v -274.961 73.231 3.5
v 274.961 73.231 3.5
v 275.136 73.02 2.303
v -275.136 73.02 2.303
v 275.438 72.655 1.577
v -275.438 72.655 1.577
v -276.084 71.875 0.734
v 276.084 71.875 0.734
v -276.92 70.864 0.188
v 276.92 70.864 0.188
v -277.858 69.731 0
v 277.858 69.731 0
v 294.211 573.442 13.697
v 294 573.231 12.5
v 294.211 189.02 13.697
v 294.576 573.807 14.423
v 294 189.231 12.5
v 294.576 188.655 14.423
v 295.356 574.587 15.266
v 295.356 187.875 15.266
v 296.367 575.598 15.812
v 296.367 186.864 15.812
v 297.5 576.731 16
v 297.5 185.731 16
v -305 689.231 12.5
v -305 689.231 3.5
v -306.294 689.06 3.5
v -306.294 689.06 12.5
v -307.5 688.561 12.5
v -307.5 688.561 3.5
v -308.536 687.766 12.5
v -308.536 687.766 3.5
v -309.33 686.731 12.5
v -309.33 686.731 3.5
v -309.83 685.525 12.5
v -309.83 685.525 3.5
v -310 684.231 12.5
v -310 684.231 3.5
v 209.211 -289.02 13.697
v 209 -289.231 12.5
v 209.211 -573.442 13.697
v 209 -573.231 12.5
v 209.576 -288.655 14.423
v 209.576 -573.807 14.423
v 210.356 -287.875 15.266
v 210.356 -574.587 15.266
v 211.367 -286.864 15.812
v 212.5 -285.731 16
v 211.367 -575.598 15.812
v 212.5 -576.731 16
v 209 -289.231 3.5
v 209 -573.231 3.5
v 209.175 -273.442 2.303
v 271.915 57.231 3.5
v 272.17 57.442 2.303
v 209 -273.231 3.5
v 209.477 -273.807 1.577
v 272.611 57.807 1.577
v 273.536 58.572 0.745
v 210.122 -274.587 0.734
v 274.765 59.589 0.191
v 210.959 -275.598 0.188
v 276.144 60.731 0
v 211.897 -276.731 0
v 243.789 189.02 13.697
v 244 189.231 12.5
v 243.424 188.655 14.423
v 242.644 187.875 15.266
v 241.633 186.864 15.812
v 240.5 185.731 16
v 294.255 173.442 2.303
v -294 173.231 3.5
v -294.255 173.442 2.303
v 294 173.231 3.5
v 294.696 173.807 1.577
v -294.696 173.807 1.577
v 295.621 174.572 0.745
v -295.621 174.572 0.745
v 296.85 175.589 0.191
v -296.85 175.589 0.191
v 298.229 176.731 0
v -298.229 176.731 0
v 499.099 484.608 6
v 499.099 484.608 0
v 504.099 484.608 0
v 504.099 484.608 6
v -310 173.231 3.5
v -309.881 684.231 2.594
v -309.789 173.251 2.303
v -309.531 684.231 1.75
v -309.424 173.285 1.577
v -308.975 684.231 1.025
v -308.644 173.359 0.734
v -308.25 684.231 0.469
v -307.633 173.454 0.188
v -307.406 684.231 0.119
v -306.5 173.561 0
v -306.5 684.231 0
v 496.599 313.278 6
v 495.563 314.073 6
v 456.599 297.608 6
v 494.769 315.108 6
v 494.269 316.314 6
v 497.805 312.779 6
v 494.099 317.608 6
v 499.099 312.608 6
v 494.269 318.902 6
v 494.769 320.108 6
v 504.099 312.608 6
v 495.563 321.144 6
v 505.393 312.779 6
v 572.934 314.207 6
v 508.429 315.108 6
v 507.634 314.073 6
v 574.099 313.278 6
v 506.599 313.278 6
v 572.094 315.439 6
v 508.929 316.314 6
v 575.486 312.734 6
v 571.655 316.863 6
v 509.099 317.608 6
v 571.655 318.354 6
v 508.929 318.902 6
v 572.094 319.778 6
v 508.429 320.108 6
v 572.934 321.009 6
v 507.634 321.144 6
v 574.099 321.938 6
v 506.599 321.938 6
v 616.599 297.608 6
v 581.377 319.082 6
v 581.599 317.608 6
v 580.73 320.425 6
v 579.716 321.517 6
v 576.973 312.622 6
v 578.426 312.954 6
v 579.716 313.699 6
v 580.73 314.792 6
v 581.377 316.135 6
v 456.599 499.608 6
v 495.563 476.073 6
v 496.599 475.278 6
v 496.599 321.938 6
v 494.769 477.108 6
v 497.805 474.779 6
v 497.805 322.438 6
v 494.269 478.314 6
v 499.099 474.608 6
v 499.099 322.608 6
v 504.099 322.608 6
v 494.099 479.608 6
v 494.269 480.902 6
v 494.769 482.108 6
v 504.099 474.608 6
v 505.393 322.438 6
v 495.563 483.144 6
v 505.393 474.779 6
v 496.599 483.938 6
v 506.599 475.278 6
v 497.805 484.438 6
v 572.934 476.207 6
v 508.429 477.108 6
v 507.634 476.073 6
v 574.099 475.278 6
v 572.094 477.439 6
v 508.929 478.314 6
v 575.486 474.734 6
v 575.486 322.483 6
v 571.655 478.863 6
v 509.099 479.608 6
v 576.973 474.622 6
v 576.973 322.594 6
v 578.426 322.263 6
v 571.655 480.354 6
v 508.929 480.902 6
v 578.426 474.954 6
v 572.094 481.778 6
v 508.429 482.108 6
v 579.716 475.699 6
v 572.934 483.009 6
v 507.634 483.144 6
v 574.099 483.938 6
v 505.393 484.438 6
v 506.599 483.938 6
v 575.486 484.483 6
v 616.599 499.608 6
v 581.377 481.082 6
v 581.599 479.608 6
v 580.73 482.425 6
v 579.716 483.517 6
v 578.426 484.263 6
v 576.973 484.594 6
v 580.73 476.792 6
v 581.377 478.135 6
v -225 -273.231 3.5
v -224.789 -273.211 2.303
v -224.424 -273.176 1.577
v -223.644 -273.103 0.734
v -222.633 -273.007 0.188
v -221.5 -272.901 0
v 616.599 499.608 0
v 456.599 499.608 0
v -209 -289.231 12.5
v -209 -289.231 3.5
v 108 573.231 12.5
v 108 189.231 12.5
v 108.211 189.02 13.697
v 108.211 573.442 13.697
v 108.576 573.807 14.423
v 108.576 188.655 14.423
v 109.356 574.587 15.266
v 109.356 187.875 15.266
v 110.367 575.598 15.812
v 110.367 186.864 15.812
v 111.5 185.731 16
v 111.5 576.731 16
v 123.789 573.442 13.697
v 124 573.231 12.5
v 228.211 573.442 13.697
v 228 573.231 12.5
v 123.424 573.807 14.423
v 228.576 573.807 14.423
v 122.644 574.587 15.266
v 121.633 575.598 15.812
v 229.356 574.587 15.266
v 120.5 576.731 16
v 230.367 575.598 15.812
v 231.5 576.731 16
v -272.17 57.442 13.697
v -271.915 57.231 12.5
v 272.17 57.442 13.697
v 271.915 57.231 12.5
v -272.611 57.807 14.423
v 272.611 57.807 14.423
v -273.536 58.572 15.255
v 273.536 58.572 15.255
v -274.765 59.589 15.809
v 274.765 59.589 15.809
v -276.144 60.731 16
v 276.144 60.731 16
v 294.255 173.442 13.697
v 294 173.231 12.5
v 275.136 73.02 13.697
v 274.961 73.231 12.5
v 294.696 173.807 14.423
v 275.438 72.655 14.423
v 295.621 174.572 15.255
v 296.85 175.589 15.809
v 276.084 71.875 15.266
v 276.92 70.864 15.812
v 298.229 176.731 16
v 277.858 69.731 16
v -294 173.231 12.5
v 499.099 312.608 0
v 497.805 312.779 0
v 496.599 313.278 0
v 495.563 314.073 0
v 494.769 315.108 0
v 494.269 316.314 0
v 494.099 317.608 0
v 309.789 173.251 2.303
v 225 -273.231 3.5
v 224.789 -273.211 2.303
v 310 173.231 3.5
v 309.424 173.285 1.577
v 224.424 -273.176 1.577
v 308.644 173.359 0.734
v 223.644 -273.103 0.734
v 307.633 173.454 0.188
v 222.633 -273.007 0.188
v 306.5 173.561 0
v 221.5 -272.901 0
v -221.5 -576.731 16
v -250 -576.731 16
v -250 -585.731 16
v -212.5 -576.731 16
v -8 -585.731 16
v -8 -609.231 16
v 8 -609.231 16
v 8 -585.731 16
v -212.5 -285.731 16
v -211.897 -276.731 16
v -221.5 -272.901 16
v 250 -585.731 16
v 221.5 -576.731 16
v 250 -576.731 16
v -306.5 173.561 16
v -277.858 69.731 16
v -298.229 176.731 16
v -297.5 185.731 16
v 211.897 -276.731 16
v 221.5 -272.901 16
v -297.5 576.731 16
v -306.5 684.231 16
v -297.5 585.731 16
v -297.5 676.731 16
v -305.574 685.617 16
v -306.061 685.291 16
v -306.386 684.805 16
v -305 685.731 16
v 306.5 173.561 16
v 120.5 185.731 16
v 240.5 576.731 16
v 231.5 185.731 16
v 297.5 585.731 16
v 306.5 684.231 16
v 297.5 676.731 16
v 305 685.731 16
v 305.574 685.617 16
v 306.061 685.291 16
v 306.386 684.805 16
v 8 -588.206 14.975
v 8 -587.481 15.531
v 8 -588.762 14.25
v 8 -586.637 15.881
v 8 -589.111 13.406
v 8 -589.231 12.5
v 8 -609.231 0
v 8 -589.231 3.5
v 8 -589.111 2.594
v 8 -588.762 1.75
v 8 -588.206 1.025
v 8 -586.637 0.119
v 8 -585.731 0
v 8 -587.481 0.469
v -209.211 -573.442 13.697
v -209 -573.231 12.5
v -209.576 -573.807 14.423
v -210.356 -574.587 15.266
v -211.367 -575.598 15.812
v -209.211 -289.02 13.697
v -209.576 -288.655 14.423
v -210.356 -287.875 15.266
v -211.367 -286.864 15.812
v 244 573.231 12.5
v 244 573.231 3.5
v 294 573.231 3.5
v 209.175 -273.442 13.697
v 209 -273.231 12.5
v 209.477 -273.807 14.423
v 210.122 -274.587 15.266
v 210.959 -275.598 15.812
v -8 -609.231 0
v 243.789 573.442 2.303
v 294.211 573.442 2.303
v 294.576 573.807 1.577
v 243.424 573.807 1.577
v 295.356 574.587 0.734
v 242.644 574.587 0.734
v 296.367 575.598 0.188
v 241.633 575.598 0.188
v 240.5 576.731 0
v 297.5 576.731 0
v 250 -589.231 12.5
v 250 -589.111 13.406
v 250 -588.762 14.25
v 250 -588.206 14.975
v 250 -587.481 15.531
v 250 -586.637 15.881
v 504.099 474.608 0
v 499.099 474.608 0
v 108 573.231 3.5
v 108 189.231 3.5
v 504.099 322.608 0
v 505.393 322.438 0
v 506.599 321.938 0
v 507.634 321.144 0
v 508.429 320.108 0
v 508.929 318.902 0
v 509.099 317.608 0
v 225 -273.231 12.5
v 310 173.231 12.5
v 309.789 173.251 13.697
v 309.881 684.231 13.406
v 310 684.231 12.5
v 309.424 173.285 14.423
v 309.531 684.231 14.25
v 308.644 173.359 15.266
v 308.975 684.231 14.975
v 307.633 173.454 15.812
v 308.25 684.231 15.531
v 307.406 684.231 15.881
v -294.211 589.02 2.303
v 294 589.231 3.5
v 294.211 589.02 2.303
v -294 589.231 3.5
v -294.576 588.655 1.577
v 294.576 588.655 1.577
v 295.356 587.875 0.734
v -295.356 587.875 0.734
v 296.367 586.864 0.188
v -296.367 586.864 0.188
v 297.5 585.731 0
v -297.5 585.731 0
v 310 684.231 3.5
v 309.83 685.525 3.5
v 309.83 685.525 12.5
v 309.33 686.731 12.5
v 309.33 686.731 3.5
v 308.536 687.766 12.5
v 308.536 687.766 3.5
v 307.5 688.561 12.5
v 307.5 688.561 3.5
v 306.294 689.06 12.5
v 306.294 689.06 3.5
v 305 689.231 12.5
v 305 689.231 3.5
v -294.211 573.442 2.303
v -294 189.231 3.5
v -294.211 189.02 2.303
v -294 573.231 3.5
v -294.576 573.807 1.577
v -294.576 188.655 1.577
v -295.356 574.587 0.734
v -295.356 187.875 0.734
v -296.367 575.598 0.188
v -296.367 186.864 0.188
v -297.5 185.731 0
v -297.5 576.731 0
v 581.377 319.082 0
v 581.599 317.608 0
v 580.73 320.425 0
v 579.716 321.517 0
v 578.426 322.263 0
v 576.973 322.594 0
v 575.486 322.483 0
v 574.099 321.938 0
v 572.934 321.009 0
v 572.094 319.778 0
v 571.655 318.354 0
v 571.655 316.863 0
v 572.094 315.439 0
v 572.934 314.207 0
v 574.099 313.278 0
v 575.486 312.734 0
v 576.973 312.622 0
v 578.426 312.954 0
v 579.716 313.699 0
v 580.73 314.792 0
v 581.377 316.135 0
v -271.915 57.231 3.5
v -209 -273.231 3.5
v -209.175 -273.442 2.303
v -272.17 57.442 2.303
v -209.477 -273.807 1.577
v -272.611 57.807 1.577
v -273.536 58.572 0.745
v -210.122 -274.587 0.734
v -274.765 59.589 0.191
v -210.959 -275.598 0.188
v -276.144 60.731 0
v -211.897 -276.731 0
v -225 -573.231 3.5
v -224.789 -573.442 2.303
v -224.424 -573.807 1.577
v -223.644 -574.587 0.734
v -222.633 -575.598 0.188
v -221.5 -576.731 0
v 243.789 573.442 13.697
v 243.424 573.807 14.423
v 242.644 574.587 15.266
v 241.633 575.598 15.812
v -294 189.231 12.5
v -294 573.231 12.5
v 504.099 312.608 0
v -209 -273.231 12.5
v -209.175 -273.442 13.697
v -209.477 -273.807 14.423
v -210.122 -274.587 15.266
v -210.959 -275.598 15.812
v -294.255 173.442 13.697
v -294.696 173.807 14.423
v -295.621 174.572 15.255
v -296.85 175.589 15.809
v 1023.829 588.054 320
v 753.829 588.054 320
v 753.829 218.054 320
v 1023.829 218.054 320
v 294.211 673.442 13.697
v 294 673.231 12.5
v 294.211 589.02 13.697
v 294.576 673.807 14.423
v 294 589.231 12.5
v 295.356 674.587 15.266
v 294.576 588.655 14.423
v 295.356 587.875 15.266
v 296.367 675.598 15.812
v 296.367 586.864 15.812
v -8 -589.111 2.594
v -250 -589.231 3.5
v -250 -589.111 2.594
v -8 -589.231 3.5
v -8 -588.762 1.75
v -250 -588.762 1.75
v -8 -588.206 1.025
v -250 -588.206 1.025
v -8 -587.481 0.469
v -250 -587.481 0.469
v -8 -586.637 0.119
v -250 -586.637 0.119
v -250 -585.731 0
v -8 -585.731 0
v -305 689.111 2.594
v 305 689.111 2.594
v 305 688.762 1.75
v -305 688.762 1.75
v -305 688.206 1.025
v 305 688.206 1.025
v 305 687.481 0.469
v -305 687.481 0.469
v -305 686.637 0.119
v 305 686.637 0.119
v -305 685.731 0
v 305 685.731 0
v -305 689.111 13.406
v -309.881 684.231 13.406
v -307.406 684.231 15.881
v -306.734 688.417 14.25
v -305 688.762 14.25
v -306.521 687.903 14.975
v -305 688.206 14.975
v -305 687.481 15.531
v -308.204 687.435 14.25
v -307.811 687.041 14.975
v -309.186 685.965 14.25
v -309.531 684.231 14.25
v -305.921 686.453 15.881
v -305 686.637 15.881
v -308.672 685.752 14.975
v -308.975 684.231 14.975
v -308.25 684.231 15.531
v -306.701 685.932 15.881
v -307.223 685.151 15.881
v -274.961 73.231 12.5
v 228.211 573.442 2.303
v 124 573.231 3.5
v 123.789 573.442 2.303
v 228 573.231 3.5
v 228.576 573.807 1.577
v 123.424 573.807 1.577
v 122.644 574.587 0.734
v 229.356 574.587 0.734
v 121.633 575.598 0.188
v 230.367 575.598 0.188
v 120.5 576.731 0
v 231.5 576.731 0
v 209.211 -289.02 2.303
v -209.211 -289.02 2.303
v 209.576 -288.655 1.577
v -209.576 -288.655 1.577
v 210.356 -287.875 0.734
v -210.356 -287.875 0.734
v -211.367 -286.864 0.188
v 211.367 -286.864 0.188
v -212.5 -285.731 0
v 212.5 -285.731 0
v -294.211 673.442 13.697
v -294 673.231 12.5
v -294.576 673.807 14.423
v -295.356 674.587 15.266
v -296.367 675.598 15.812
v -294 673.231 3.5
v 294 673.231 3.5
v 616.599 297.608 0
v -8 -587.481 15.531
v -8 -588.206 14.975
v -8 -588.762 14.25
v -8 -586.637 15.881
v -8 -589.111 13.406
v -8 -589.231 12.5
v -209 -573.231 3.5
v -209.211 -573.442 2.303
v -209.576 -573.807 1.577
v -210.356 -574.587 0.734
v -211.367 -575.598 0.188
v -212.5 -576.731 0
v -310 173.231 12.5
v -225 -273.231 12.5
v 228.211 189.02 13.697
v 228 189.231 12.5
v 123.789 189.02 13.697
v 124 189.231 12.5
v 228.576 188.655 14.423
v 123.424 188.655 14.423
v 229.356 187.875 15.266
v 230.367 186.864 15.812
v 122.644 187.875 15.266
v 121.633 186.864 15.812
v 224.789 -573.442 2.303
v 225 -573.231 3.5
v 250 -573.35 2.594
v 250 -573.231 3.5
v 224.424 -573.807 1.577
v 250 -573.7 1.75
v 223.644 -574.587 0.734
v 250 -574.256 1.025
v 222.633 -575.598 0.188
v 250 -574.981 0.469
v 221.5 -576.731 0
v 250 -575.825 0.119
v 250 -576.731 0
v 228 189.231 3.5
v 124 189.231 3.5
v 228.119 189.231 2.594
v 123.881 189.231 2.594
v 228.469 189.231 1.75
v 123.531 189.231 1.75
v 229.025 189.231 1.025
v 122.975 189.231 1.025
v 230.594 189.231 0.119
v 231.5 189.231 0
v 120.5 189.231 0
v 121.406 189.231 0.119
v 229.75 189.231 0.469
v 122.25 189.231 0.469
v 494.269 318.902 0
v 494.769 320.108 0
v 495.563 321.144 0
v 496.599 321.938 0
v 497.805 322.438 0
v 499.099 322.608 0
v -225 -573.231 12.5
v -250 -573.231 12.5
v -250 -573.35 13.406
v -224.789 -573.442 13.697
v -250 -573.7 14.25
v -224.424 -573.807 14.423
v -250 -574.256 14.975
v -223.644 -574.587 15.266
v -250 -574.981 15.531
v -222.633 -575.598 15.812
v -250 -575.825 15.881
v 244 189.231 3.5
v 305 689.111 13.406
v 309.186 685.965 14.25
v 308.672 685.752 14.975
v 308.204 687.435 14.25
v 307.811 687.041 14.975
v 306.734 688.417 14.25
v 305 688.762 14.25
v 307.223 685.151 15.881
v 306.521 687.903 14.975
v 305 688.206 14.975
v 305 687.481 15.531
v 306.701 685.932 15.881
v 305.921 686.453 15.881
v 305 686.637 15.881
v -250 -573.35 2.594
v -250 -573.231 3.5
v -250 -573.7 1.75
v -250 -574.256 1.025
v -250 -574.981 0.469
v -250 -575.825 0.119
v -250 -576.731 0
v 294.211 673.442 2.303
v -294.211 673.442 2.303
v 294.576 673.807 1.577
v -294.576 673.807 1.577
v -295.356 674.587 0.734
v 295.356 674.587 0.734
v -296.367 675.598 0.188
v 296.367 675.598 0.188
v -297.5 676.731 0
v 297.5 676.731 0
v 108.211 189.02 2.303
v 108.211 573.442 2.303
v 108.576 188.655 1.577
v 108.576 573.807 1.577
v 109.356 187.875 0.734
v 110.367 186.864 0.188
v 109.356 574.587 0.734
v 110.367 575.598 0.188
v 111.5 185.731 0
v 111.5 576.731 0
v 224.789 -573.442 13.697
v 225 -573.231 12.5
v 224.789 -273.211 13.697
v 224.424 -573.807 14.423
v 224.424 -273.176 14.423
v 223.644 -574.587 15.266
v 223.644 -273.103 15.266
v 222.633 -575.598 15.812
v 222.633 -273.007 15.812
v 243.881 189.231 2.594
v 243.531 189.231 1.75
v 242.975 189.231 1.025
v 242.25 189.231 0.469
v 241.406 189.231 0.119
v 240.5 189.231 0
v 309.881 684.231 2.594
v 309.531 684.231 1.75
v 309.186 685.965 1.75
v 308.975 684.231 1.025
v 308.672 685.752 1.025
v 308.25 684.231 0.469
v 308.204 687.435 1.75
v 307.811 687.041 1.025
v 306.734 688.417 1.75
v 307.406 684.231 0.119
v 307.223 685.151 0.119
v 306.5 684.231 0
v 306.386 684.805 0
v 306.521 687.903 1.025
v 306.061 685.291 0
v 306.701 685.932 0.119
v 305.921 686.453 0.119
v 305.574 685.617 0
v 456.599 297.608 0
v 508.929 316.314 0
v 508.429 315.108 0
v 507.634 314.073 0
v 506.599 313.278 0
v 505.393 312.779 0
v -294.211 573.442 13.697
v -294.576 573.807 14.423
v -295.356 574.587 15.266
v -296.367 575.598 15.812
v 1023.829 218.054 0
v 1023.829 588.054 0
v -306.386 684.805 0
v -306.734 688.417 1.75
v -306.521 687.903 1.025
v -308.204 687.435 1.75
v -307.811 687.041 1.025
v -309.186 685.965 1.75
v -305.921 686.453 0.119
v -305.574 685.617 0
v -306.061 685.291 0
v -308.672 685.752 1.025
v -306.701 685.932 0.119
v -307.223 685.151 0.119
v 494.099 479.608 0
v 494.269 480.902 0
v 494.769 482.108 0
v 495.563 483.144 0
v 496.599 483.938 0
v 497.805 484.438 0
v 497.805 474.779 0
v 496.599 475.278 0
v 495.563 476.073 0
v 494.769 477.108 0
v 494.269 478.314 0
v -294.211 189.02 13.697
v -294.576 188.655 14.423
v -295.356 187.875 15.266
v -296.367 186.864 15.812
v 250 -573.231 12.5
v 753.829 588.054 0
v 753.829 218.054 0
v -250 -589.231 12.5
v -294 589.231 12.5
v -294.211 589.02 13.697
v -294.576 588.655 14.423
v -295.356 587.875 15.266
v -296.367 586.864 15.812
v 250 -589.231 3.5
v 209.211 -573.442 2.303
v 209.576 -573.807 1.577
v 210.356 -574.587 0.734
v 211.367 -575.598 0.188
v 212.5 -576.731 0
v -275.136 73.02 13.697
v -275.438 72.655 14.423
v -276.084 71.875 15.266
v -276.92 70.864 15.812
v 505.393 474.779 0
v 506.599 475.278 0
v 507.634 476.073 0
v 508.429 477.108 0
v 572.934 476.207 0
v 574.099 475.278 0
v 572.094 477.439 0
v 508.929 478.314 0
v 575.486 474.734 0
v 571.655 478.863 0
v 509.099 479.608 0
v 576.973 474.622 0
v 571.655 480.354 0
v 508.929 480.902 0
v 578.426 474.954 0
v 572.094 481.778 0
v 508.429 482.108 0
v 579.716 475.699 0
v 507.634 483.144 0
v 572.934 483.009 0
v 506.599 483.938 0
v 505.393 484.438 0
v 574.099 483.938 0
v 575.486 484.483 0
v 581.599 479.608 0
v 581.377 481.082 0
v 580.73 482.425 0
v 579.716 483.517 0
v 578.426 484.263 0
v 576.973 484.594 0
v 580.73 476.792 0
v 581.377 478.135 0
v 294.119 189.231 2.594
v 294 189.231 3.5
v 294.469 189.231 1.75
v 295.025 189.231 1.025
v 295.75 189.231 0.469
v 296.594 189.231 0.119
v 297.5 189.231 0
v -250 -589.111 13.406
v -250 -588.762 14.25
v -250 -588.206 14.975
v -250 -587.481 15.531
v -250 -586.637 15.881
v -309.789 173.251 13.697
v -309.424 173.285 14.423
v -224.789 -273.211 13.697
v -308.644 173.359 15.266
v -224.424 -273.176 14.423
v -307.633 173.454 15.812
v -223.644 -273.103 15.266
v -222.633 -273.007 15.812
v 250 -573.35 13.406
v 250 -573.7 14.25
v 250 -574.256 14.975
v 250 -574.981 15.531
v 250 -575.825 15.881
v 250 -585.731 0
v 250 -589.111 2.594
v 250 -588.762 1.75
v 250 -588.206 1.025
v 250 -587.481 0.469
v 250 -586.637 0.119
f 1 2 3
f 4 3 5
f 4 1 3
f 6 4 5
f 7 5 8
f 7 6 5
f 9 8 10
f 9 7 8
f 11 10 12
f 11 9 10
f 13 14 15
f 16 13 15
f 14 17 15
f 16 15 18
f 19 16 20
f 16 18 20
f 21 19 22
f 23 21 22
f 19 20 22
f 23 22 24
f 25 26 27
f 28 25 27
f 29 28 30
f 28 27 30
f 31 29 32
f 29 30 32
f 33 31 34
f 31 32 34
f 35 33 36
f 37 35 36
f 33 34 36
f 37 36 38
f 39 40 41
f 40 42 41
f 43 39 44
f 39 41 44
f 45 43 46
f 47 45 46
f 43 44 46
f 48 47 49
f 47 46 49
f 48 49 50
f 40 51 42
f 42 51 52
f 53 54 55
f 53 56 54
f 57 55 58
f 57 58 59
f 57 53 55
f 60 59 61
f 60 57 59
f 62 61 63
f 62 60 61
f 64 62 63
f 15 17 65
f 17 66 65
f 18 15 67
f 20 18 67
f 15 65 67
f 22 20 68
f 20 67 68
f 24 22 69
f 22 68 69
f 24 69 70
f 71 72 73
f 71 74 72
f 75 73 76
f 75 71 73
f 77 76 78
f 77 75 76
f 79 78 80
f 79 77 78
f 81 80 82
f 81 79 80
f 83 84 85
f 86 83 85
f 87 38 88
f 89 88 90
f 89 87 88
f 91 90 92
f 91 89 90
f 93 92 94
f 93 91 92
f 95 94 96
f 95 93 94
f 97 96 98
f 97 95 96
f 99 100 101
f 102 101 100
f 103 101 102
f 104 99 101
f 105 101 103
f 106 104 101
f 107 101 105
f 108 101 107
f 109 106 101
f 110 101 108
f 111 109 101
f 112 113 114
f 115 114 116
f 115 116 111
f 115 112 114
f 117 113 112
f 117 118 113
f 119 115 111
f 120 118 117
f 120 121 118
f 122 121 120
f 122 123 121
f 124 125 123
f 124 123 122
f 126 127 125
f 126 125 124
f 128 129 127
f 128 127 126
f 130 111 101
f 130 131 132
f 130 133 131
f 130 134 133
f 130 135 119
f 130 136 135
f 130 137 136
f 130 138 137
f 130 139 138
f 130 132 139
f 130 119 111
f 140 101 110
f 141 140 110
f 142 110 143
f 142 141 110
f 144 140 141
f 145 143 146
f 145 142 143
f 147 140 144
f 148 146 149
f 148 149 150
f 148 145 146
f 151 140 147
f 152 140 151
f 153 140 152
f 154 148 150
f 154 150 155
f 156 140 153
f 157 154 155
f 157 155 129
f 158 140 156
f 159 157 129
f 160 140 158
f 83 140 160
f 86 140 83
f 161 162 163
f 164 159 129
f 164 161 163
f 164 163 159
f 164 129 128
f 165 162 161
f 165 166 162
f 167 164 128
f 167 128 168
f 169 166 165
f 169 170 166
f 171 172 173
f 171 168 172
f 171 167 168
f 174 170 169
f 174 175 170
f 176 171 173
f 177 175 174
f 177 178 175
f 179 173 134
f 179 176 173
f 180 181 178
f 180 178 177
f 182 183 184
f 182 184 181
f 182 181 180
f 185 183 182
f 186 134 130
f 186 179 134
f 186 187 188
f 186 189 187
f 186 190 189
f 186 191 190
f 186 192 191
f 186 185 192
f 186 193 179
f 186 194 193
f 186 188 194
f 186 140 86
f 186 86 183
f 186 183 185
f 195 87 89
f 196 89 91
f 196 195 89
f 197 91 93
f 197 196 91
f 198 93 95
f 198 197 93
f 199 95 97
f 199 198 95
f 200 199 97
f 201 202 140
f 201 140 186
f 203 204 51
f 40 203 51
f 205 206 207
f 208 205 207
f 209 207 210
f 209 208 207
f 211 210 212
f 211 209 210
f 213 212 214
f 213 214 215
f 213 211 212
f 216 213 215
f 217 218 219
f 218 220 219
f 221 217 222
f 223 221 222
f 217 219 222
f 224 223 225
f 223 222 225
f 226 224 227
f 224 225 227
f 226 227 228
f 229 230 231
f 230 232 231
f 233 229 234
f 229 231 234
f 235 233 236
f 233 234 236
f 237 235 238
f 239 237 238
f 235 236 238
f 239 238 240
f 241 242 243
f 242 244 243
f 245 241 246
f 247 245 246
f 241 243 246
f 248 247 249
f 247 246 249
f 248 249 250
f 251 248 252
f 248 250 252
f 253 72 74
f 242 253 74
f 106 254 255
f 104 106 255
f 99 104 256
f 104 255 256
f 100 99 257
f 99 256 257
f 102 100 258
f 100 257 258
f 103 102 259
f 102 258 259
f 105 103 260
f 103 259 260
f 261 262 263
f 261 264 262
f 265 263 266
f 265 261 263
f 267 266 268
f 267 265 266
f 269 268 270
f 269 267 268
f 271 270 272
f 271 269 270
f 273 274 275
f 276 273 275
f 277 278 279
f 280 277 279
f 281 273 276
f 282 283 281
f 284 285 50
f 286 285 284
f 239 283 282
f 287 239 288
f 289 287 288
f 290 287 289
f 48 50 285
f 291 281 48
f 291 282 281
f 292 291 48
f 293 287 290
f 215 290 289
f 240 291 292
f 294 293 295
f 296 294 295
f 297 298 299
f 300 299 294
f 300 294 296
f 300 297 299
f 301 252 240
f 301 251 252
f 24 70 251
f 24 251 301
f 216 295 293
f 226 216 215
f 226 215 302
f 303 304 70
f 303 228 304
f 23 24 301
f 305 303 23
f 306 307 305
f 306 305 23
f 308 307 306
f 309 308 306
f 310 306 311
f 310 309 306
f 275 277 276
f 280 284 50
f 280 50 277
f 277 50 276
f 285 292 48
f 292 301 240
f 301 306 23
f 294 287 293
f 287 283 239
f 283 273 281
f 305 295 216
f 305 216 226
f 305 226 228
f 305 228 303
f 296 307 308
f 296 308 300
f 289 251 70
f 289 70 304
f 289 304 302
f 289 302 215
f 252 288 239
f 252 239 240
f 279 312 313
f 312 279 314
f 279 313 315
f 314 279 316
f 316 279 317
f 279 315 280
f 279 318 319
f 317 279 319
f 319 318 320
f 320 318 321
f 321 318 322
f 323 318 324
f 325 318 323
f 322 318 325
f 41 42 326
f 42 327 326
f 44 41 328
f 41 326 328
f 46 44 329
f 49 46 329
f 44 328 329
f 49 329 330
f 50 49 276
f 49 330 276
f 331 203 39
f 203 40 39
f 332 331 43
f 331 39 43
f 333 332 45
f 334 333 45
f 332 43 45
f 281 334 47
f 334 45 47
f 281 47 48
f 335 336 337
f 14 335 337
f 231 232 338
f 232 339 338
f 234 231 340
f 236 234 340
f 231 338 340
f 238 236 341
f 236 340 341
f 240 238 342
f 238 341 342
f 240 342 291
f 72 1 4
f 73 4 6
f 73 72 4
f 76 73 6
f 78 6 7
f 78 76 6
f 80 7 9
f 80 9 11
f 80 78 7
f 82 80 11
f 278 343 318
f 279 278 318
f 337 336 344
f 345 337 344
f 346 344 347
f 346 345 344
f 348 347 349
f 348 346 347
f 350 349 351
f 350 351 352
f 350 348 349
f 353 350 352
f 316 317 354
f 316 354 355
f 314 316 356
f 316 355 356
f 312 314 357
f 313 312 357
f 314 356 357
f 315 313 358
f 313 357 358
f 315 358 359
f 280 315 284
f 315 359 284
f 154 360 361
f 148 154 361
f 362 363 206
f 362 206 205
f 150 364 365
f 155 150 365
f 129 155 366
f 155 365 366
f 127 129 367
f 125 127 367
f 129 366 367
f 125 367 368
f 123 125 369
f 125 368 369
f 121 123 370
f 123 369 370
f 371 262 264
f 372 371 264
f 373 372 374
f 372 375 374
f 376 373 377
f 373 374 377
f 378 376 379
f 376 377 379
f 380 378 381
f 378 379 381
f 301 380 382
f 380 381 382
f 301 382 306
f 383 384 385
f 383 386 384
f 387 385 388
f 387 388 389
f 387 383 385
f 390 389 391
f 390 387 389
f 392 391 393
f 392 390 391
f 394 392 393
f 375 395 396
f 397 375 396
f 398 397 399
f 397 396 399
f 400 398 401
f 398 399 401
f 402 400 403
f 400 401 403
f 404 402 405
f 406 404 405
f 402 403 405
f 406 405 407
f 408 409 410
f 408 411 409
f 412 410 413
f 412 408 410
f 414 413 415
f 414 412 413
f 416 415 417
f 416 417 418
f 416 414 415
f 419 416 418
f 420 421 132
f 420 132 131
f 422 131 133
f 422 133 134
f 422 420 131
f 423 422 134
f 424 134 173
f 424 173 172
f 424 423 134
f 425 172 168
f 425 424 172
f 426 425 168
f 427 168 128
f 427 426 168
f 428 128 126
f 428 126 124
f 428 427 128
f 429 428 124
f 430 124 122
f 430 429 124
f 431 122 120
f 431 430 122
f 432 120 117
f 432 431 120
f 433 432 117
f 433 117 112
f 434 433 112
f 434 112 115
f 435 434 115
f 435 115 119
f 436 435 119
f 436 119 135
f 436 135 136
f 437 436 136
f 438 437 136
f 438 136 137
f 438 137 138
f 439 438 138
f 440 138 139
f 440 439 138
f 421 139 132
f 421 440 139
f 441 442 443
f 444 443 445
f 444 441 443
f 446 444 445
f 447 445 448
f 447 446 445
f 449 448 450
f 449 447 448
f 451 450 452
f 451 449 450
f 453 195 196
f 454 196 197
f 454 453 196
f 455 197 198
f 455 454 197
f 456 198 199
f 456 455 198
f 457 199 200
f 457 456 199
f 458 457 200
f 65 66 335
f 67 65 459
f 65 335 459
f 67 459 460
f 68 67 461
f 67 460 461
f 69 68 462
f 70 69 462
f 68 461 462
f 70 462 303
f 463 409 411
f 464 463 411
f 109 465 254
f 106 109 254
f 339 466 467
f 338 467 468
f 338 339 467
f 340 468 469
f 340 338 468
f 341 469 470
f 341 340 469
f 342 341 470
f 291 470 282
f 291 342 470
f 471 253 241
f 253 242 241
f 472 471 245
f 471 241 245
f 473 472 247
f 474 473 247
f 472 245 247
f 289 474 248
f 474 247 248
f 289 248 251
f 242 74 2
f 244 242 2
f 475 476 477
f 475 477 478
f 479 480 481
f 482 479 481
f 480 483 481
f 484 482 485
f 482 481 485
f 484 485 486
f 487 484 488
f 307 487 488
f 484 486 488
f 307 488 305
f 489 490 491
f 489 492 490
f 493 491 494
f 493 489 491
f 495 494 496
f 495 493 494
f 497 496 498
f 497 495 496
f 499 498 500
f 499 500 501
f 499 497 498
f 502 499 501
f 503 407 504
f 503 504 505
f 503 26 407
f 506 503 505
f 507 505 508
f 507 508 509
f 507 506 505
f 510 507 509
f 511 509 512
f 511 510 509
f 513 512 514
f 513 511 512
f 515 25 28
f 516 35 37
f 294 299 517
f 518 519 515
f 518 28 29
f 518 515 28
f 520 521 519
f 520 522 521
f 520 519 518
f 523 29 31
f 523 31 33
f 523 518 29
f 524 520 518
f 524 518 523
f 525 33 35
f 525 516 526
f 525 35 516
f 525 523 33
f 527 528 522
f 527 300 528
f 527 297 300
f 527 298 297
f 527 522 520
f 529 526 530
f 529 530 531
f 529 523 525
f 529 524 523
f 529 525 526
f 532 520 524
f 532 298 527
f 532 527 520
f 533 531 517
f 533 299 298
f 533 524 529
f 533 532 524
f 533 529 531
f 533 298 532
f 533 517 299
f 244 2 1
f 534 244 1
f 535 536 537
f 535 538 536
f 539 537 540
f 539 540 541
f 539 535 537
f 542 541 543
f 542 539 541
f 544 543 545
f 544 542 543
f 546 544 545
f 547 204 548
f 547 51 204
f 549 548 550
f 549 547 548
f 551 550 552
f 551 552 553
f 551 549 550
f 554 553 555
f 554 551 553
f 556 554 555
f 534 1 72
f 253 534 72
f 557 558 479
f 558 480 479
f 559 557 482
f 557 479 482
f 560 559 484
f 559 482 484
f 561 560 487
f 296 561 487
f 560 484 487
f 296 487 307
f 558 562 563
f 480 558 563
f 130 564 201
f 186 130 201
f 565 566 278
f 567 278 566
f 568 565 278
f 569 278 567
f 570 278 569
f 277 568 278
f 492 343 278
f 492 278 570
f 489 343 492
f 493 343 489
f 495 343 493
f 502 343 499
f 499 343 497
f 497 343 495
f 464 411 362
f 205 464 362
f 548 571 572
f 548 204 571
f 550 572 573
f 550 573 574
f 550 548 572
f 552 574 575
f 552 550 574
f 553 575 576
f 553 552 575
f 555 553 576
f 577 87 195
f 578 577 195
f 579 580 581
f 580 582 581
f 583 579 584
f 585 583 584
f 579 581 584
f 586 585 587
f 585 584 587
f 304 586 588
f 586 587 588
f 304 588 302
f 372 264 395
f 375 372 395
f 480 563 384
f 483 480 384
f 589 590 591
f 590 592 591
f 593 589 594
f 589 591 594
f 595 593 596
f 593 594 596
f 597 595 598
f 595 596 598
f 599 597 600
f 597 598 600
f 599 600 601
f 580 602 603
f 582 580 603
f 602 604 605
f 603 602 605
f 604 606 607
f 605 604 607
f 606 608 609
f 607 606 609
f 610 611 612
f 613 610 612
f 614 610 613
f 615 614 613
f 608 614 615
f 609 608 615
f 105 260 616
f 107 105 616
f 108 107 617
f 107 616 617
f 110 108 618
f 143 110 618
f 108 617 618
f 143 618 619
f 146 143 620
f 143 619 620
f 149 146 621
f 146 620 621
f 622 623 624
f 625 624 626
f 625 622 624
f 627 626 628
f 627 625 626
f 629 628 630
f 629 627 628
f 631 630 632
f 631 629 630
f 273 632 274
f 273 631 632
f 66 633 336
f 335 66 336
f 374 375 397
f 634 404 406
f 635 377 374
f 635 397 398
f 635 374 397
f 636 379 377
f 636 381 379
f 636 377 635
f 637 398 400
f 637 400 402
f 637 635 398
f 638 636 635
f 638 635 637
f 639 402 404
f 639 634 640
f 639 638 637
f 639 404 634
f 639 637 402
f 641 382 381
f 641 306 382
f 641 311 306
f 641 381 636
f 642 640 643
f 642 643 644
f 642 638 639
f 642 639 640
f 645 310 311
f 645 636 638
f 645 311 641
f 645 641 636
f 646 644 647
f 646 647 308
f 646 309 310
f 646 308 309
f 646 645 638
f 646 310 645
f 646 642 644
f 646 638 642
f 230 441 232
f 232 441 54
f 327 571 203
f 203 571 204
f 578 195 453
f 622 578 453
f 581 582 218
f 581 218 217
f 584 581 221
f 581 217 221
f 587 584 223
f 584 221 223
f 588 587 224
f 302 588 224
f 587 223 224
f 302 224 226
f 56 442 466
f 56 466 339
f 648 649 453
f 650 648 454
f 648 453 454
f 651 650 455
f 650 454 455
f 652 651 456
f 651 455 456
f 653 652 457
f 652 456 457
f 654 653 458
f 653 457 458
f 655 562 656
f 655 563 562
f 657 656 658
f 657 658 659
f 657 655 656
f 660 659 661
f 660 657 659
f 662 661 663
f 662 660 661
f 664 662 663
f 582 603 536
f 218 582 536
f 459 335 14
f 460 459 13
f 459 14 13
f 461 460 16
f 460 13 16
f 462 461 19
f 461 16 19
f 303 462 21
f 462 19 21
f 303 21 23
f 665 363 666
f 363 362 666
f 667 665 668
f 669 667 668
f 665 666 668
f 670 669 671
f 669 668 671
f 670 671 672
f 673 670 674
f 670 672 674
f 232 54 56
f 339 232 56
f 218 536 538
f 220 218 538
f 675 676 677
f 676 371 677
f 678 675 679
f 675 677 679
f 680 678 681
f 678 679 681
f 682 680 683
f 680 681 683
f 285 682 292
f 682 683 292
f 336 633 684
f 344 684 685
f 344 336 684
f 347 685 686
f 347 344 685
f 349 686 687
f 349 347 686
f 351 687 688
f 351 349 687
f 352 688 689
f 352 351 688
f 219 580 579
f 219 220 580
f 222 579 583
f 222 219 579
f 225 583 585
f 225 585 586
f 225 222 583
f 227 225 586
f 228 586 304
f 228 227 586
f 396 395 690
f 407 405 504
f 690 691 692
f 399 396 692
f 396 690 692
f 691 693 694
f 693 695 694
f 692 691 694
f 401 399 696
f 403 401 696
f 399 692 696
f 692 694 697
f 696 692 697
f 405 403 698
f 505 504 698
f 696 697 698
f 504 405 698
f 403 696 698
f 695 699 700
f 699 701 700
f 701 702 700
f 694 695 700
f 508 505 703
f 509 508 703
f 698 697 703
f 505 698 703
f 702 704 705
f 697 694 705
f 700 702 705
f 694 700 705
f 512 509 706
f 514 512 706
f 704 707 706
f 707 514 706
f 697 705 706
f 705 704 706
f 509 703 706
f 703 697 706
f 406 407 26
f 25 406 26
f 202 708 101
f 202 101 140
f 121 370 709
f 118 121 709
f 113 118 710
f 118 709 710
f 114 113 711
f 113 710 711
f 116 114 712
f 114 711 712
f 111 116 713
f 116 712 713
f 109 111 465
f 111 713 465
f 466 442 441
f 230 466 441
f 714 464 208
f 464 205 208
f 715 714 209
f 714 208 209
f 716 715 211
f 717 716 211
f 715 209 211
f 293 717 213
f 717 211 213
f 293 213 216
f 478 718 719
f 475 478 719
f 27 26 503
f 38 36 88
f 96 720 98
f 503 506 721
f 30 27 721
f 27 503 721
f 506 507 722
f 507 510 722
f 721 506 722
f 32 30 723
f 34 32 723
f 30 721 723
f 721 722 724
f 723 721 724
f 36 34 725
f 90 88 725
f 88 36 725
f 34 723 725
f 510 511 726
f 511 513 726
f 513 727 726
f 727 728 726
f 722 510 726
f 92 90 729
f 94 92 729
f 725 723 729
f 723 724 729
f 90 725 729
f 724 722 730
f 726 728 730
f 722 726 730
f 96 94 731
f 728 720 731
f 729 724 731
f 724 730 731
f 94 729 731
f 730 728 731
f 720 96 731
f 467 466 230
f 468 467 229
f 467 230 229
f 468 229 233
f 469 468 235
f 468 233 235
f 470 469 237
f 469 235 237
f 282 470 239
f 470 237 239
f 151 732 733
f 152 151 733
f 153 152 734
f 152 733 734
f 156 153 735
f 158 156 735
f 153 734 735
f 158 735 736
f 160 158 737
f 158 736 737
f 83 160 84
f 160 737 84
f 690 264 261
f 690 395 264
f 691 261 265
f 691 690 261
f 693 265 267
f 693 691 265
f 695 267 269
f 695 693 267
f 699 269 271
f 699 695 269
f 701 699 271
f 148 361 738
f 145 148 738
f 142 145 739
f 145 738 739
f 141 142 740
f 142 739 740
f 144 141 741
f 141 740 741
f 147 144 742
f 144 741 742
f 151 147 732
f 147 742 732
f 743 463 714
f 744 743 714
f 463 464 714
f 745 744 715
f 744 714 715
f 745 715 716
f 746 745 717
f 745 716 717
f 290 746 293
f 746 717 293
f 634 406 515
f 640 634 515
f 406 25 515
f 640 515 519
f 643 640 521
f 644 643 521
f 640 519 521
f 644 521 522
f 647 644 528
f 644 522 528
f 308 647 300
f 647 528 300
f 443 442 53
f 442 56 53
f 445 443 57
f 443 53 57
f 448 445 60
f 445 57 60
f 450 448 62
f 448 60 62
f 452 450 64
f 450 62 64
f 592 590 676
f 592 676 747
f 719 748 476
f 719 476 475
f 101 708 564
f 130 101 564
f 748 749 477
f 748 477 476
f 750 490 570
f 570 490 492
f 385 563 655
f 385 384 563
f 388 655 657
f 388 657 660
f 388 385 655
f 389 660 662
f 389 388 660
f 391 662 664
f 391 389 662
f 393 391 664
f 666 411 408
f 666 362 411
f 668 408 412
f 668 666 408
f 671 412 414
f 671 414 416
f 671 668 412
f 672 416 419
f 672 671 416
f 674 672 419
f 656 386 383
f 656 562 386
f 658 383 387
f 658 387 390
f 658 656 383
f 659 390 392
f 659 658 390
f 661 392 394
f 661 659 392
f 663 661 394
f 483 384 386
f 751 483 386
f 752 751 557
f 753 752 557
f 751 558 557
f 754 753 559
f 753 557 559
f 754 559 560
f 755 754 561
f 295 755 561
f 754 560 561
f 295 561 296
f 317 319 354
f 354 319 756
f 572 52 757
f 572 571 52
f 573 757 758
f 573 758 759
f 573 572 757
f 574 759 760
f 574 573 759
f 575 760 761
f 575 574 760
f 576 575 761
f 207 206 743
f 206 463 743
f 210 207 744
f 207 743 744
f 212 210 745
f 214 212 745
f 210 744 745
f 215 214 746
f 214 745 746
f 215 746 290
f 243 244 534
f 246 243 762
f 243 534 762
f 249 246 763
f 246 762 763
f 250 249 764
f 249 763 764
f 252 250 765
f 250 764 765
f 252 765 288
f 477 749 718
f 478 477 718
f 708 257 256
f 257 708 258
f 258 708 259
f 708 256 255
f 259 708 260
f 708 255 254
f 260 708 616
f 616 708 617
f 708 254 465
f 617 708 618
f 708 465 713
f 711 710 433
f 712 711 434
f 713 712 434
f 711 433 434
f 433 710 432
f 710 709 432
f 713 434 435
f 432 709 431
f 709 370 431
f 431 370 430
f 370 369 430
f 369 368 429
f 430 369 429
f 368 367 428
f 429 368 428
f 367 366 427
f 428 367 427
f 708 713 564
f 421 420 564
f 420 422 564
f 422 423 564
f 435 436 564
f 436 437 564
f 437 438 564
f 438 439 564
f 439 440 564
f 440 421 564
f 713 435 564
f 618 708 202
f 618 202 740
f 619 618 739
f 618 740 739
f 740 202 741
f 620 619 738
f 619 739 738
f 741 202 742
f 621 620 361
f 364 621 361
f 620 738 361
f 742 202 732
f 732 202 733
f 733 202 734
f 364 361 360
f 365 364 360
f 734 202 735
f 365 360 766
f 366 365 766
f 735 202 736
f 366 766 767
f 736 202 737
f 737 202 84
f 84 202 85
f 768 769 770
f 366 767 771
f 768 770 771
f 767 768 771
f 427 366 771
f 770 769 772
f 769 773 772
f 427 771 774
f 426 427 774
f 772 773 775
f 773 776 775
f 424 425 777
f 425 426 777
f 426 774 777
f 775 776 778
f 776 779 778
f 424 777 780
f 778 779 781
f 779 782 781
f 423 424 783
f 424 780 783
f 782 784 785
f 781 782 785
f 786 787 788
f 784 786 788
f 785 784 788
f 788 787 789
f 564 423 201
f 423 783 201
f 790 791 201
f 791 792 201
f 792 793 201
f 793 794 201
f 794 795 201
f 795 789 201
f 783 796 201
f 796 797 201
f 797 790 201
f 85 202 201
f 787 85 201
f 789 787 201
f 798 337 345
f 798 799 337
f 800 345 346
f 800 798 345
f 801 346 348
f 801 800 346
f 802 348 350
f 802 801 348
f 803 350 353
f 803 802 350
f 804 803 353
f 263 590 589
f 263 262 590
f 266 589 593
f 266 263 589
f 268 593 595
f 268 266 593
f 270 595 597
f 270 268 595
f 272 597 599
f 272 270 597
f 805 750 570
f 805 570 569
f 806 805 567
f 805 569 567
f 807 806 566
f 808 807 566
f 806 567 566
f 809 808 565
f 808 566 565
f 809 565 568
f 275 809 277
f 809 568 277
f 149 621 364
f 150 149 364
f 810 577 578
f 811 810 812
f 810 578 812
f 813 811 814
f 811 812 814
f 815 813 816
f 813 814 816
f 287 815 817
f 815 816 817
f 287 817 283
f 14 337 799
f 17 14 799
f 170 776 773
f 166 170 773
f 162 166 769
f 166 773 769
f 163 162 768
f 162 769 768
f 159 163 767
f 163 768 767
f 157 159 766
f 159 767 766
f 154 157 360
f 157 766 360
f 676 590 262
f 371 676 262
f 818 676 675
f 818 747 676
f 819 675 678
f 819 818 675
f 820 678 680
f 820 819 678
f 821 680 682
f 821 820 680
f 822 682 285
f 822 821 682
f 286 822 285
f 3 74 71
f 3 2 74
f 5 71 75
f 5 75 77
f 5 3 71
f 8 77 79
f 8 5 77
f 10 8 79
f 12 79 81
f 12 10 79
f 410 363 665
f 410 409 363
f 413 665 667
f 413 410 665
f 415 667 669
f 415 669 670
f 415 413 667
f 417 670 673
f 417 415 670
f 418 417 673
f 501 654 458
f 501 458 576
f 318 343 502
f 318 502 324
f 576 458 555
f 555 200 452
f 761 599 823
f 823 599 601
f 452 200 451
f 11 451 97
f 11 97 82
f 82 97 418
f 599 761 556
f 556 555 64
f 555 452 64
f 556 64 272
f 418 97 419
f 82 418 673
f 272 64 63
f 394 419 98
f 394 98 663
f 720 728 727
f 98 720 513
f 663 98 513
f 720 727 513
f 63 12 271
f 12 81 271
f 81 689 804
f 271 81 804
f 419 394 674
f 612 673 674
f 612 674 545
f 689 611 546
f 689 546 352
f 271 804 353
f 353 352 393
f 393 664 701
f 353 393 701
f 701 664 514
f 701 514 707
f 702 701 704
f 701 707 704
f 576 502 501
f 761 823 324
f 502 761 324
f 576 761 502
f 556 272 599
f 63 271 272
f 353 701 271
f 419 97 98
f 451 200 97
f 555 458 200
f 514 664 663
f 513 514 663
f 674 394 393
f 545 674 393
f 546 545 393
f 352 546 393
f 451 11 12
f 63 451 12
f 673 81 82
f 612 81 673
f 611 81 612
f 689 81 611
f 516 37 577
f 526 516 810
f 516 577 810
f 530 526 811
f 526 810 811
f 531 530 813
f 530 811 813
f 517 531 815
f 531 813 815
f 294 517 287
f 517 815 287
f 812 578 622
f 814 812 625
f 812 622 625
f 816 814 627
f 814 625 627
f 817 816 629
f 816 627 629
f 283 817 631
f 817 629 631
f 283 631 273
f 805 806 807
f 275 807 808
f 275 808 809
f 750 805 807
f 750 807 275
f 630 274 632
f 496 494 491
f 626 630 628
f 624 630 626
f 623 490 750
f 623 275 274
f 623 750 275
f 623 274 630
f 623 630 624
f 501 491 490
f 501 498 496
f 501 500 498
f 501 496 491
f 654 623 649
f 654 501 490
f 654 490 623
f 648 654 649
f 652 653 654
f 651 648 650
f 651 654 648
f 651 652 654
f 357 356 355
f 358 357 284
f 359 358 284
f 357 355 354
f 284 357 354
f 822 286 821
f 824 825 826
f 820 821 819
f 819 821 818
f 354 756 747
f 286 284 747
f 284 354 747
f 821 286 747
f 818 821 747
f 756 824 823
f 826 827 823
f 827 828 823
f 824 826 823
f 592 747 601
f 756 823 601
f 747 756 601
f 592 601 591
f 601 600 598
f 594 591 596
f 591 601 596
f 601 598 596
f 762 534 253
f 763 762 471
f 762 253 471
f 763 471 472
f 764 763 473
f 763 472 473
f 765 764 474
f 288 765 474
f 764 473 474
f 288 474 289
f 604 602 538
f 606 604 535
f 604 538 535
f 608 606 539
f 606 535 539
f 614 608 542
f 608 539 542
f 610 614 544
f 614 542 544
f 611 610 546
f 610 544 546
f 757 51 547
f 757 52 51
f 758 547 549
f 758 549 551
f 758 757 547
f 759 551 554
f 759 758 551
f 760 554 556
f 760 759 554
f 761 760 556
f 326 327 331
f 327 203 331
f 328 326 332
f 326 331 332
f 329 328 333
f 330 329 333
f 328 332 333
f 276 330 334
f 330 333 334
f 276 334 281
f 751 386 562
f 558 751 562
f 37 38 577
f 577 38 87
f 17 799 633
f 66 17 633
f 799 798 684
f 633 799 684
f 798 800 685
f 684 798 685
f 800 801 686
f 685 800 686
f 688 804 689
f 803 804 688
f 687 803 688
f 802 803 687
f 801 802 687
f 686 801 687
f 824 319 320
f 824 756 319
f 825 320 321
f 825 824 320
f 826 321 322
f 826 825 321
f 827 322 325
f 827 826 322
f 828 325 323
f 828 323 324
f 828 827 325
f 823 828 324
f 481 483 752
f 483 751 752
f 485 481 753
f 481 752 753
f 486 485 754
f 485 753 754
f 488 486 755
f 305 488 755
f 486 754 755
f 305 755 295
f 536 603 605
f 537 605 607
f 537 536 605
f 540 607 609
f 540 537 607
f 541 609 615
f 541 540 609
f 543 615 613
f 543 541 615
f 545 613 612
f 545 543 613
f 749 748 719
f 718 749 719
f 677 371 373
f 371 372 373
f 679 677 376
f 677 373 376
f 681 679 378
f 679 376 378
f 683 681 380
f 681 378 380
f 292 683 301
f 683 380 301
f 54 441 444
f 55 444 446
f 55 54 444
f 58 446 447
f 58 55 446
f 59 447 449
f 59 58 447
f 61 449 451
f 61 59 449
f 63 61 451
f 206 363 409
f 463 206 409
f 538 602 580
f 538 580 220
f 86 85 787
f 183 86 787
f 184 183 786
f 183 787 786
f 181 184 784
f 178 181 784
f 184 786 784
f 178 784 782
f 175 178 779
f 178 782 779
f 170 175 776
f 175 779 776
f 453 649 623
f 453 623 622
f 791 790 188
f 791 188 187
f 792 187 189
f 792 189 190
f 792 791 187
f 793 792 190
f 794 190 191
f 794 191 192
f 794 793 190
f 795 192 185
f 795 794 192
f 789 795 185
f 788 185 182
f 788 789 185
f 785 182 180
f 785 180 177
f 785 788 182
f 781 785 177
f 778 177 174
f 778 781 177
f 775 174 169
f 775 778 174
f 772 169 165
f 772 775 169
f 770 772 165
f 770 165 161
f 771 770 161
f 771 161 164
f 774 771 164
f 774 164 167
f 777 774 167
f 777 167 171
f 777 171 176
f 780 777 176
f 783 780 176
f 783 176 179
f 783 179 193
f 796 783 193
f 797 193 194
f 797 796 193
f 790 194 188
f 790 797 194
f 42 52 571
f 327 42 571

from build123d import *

# Parameters (mm, degrees)
F0_W     = 25
F0_H     = 16
F0_W_2   = 16
F0_H_2   = 20
F0_H_3   = 384
F0_W_3   = 418
F1_DEPTH = 16
F2_R     = 3.5
F3_W     = 270
F3_H     = 370
F4_DEPTH = 320
F5_W     = 160
F5_H     = 202
F5_R     = 5
F6_DEPTH = 6


# Not quite as in the source:
# - a feature names something its author has since deleted; it is built from what else it names


with BuildPart() as f1:
    # F0 (on Top) → F1 (new body)
    with BuildSketch(Plane.XY):
        Polygon((209, -589.2307258319), (225, -589.2307258319), (225, -573.2307258319), (225, -273.2307258319), (310, 173.2307258319), (310, 589.2307258319), (294, 589.2307258319), (-294, 589.2307258319), (-310, 589.2307258319), (-310, 173.2307258319), (-225, -273.2307258319), (-225, -573.2307258319), (-225, -589.2307258319), (-209, -589.2307258319), (-8, -589.2307258319), (8, -589.2307258319), align=None)
        Polygon((244, 573.2307258319), (294, 573.2307258319), (294, 189.2307258319), (294, 173.2307258319), (274.9614022256, 73.2307258319), (271.9152265817, 57.2307258319), (209, -273.2307258319), (209, -289.2307258319), (209, -573.2307258319), (-209, -573.2307258319), (-209, -289.2307258319), (-209, -273.2307258319), (-271.9152265817, 57.2307258319), (-274.9614022256, 73.2307258319), (-294, 173.2307258319), (-294, 189.2307258319), (-294, 573.2307258319), (108, 573.2307258319), (124, 573.2307258319), (228, 573.2307258319), align=None, mode=Mode.SUBTRACT)
        with Locations((237.5, -581.2307258319)):
            Rectangle(F0_W, F0_H)
        with Locations((0, -599.2307258319)):
            Rectangle(F0_W_2, F0_H_2)
        with BuildLine():
            Line((294, 589.2307258319), (310, 589.2307258319))
            Line((310, 589.2307258319), (310, 684.2307258319))
            ThreePointArc((310, 684.2307258319), (308.5355339059, 687.7662597378), (305, 689.2307258319))
            Line((305, 689.2307258319), (-305, 689.2307258319))
            ThreePointArc((-305, 689.2307258319), (-308.5355339059, 687.7662597378), (-310, 684.2307258319))
            Line((-310, 684.2307258319), (-310, 589.2307258319))
            Line((-310, 589.2307258319), (-294, 589.2307258319))
            Line((-294, 589.2307258319), (-294, 673.2307258319))
            Line((-294, 673.2307258319), (294, 673.2307258319))
            Line((294, 673.2307258319), (294, 589.2307258319))
        make_face()
        with Locations((-237.5, -581.2307258319)):
            Rectangle(F0_W, F0_H)
        with Locations((236, 381.2307258319)):
            Rectangle(F0_W_2, F0_H_3)
        Polygon((294, 173.2307258319), (294, 189.2307258319), (244, 189.2307258319), (228, 189.2307258319), (124, 189.2307258319), (108, 189.2307258319), (-294, 189.2307258319), (-294, 173.2307258319), align=None)
        with Locations((116, 381.2307258319)):
            Rectangle(F0_W_2, F0_H_3)
        Polygon((271.9152265817, 57.2307258319), (274.9614022256, 73.2307258319), (-274.9614022256, 73.2307258319), (-271.9152265817, 57.2307258319), align=None)
        with Locations((0, -281.2307258319)):
            Rectangle(F0_W_3, F0_H)
    extrude(amount=F1_DEPTH)

    # F2
    f2_edges = [f1.edges().sort_by_distance(p)[0] for p in [
        (0, -573.230726, 16),
        (-93, 573.230726, 16),
        (0, 589.230726, 16),
        (0, 673.230726, 16),
        (0, 689.230726, 16),
        (310, 428.730726, 16),
        (294, 631.230726, 16),
        (-294, 631.230726, 16),
        (-310, 428.730726, 16),
        (0, 689.230726, 0),
        (0, -573.230726, 0),
        (0, 673.230726, 0),
        (-294, 381.230726, 16),
        (294, 381.230726, 16),
        (-240.457613, -108, 16),
        (240.457613, -108, 16),
        (0, -273.230726, 16),
        (0, -289.230726, 16),
        (-267.5, -50, 16),
        (-209, -431.230726, 16),
        (209, -431.230726, 16),
        (267.5, -50, 16),
        (0, -289.230726, 0),
        (0, -273.230726, 0),
        (240.457613, -108, 0),
        (267.5, -50, 0),
        (-240.457613, -108, 0),
        (-225, -423.230726, 0),
        (-267.5, -50, 0),
        (294, 381.230726, 0),
        (-294, 381.230726, 0),
        (-93, 573.230726, 0),
        (0, 589.230726, 0),
        (294, 631.230726, 0),
        (310, 428.730726, 0),
        (-294, 631.230726, 0),
        (209, -431.230726, 0),
        (0, 173.230726, 16),
        (-93, 189.230726, 16),
        (108, 381.230726, 16),
        (124, 381.230726, 16),
        (228, 381.230726, 16),
        (244, 381.230726, 16),
        (108, 381.230726, 0),
        (228, 381.230726, 0),
        (244, 381.230726, 0),
        (124, 381.230726, 0),
        (0, 73.230726, 16),
        (0, 57.230726, 16),
        (0, 73.230726, 0),
        (0, 57.230726, 0),
        (0, 173.230726, 0),
        (-93, 189.230726, 0),
        (-237.5, -573.230726, 16),
        (-129, -589.230726, 0),
        (-237.5, -573.230726, 0),
        (-129, -589.230726, 16),
        (237.5, -573.230726, 16),
        (129, -589.230726, 16),
        (129, -589.230726, 0),
        (237.5, -573.230726, 0),
        (225, -423.230726, 0),
        (225, -423.230726, 16),
        (-225, -423.230726, 16),
        (-209, -431.230726, 0),
        (308.535534, 687.76626, 0),
        (308.535534, 687.76626, 16),
        (-308.535534, 687.76626, 0),
        (-308.535534, 687.76626, 16),
        (-310, 428.730726, 0),
        (-284.480701, 123.230726, 0),
        (-284.480701, 123.230726, 16),
        (284.480701, 123.230726, 0),
        (284.480701, 123.230726, 16),
        (176, 573.230726, 0),
        (176, 573.230726, 16),
        (176, 189.230726, 16),
        (269, 573.230726, 0),
        (269, 573.230726, 16),
        (269, 189.230726, 16),
    ]]
    fillet(f2_edges, radius=F2_R)


with BuildPart() as f4:
    # F3 (on Top) → F4 (new body)
    with BuildSketch(Plane.XY):
        with Locations((888.8288272917, 403.0536437035)):
            Rectangle(F3_W, F3_H)
    extrude(amount=F4_DEPTH)


with BuildPart() as f6:
    # F5 (on Top) → F6 (new body)
    with BuildSketch(Plane.XY):
        with Locations((536.598880291, 398.6082916385)):
            Rectangle(F5_W, F5_H)
        with BuildLine():
            ThreePointArc((494.098880291, 317.6082916385), (495.5633463851, 321.1438255445), (499.098880291, 322.6082916385))
            Line((499.098880291, 322.6082916385), (504.098880291, 322.6082916385))
            ThreePointArc((504.098880291, 322.6082916385), (507.6344141969, 321.1438255445), (509.098880291, 317.6082916385))
            ThreePointArc((509.098880291, 317.6082916385), (507.6344141969, 314.0727577326), (504.098880291, 312.6082916385))
            Line((504.098880291, 312.6082916385), (499.098880291, 312.6082916385))
            ThreePointArc((499.098880291, 312.6082916385), (495.5633463851, 314.0727577326), (494.098880291, 317.6082916385))
        make_face(mode=Mode.SUBTRACT)
        with Locations((576.598880291, 317.6082916385)):
            Circle(F5_R, mode=Mode.SUBTRACT)
        with BuildLine():
            ThreePointArc((494.098880291, 479.6082916385), (495.5633463851, 483.1438255445), (499.098880291, 484.6082916385))
            Line((499.098880291, 484.6082916385), (504.098880291, 484.6082916385))
            ThreePointArc((504.098880291, 484.6082916385), (507.6344141969, 483.1438255445), (509.098880291, 479.6082916385))
            ThreePointArc((509.098880291, 479.6082916385), (507.6344141969, 476.0727577326), (504.098880291, 474.6082916385))
            Line((504.098880291, 474.6082916385), (499.098880291, 474.6082916385))
            ThreePointArc((499.098880291, 474.6082916385), (495.5633463851, 476.0727577326), (494.098880291, 479.6082916385))
        make_face(mode=Mode.SUBTRACT)
        with Locations((576.598880291, 479.6082916385)):
            Circle(F5_R, mode=Mode.SUBTRACT)
    extrude(amount=F6_DEPTH)


solid = Compound([f1.part, f4.part, f6.part])
